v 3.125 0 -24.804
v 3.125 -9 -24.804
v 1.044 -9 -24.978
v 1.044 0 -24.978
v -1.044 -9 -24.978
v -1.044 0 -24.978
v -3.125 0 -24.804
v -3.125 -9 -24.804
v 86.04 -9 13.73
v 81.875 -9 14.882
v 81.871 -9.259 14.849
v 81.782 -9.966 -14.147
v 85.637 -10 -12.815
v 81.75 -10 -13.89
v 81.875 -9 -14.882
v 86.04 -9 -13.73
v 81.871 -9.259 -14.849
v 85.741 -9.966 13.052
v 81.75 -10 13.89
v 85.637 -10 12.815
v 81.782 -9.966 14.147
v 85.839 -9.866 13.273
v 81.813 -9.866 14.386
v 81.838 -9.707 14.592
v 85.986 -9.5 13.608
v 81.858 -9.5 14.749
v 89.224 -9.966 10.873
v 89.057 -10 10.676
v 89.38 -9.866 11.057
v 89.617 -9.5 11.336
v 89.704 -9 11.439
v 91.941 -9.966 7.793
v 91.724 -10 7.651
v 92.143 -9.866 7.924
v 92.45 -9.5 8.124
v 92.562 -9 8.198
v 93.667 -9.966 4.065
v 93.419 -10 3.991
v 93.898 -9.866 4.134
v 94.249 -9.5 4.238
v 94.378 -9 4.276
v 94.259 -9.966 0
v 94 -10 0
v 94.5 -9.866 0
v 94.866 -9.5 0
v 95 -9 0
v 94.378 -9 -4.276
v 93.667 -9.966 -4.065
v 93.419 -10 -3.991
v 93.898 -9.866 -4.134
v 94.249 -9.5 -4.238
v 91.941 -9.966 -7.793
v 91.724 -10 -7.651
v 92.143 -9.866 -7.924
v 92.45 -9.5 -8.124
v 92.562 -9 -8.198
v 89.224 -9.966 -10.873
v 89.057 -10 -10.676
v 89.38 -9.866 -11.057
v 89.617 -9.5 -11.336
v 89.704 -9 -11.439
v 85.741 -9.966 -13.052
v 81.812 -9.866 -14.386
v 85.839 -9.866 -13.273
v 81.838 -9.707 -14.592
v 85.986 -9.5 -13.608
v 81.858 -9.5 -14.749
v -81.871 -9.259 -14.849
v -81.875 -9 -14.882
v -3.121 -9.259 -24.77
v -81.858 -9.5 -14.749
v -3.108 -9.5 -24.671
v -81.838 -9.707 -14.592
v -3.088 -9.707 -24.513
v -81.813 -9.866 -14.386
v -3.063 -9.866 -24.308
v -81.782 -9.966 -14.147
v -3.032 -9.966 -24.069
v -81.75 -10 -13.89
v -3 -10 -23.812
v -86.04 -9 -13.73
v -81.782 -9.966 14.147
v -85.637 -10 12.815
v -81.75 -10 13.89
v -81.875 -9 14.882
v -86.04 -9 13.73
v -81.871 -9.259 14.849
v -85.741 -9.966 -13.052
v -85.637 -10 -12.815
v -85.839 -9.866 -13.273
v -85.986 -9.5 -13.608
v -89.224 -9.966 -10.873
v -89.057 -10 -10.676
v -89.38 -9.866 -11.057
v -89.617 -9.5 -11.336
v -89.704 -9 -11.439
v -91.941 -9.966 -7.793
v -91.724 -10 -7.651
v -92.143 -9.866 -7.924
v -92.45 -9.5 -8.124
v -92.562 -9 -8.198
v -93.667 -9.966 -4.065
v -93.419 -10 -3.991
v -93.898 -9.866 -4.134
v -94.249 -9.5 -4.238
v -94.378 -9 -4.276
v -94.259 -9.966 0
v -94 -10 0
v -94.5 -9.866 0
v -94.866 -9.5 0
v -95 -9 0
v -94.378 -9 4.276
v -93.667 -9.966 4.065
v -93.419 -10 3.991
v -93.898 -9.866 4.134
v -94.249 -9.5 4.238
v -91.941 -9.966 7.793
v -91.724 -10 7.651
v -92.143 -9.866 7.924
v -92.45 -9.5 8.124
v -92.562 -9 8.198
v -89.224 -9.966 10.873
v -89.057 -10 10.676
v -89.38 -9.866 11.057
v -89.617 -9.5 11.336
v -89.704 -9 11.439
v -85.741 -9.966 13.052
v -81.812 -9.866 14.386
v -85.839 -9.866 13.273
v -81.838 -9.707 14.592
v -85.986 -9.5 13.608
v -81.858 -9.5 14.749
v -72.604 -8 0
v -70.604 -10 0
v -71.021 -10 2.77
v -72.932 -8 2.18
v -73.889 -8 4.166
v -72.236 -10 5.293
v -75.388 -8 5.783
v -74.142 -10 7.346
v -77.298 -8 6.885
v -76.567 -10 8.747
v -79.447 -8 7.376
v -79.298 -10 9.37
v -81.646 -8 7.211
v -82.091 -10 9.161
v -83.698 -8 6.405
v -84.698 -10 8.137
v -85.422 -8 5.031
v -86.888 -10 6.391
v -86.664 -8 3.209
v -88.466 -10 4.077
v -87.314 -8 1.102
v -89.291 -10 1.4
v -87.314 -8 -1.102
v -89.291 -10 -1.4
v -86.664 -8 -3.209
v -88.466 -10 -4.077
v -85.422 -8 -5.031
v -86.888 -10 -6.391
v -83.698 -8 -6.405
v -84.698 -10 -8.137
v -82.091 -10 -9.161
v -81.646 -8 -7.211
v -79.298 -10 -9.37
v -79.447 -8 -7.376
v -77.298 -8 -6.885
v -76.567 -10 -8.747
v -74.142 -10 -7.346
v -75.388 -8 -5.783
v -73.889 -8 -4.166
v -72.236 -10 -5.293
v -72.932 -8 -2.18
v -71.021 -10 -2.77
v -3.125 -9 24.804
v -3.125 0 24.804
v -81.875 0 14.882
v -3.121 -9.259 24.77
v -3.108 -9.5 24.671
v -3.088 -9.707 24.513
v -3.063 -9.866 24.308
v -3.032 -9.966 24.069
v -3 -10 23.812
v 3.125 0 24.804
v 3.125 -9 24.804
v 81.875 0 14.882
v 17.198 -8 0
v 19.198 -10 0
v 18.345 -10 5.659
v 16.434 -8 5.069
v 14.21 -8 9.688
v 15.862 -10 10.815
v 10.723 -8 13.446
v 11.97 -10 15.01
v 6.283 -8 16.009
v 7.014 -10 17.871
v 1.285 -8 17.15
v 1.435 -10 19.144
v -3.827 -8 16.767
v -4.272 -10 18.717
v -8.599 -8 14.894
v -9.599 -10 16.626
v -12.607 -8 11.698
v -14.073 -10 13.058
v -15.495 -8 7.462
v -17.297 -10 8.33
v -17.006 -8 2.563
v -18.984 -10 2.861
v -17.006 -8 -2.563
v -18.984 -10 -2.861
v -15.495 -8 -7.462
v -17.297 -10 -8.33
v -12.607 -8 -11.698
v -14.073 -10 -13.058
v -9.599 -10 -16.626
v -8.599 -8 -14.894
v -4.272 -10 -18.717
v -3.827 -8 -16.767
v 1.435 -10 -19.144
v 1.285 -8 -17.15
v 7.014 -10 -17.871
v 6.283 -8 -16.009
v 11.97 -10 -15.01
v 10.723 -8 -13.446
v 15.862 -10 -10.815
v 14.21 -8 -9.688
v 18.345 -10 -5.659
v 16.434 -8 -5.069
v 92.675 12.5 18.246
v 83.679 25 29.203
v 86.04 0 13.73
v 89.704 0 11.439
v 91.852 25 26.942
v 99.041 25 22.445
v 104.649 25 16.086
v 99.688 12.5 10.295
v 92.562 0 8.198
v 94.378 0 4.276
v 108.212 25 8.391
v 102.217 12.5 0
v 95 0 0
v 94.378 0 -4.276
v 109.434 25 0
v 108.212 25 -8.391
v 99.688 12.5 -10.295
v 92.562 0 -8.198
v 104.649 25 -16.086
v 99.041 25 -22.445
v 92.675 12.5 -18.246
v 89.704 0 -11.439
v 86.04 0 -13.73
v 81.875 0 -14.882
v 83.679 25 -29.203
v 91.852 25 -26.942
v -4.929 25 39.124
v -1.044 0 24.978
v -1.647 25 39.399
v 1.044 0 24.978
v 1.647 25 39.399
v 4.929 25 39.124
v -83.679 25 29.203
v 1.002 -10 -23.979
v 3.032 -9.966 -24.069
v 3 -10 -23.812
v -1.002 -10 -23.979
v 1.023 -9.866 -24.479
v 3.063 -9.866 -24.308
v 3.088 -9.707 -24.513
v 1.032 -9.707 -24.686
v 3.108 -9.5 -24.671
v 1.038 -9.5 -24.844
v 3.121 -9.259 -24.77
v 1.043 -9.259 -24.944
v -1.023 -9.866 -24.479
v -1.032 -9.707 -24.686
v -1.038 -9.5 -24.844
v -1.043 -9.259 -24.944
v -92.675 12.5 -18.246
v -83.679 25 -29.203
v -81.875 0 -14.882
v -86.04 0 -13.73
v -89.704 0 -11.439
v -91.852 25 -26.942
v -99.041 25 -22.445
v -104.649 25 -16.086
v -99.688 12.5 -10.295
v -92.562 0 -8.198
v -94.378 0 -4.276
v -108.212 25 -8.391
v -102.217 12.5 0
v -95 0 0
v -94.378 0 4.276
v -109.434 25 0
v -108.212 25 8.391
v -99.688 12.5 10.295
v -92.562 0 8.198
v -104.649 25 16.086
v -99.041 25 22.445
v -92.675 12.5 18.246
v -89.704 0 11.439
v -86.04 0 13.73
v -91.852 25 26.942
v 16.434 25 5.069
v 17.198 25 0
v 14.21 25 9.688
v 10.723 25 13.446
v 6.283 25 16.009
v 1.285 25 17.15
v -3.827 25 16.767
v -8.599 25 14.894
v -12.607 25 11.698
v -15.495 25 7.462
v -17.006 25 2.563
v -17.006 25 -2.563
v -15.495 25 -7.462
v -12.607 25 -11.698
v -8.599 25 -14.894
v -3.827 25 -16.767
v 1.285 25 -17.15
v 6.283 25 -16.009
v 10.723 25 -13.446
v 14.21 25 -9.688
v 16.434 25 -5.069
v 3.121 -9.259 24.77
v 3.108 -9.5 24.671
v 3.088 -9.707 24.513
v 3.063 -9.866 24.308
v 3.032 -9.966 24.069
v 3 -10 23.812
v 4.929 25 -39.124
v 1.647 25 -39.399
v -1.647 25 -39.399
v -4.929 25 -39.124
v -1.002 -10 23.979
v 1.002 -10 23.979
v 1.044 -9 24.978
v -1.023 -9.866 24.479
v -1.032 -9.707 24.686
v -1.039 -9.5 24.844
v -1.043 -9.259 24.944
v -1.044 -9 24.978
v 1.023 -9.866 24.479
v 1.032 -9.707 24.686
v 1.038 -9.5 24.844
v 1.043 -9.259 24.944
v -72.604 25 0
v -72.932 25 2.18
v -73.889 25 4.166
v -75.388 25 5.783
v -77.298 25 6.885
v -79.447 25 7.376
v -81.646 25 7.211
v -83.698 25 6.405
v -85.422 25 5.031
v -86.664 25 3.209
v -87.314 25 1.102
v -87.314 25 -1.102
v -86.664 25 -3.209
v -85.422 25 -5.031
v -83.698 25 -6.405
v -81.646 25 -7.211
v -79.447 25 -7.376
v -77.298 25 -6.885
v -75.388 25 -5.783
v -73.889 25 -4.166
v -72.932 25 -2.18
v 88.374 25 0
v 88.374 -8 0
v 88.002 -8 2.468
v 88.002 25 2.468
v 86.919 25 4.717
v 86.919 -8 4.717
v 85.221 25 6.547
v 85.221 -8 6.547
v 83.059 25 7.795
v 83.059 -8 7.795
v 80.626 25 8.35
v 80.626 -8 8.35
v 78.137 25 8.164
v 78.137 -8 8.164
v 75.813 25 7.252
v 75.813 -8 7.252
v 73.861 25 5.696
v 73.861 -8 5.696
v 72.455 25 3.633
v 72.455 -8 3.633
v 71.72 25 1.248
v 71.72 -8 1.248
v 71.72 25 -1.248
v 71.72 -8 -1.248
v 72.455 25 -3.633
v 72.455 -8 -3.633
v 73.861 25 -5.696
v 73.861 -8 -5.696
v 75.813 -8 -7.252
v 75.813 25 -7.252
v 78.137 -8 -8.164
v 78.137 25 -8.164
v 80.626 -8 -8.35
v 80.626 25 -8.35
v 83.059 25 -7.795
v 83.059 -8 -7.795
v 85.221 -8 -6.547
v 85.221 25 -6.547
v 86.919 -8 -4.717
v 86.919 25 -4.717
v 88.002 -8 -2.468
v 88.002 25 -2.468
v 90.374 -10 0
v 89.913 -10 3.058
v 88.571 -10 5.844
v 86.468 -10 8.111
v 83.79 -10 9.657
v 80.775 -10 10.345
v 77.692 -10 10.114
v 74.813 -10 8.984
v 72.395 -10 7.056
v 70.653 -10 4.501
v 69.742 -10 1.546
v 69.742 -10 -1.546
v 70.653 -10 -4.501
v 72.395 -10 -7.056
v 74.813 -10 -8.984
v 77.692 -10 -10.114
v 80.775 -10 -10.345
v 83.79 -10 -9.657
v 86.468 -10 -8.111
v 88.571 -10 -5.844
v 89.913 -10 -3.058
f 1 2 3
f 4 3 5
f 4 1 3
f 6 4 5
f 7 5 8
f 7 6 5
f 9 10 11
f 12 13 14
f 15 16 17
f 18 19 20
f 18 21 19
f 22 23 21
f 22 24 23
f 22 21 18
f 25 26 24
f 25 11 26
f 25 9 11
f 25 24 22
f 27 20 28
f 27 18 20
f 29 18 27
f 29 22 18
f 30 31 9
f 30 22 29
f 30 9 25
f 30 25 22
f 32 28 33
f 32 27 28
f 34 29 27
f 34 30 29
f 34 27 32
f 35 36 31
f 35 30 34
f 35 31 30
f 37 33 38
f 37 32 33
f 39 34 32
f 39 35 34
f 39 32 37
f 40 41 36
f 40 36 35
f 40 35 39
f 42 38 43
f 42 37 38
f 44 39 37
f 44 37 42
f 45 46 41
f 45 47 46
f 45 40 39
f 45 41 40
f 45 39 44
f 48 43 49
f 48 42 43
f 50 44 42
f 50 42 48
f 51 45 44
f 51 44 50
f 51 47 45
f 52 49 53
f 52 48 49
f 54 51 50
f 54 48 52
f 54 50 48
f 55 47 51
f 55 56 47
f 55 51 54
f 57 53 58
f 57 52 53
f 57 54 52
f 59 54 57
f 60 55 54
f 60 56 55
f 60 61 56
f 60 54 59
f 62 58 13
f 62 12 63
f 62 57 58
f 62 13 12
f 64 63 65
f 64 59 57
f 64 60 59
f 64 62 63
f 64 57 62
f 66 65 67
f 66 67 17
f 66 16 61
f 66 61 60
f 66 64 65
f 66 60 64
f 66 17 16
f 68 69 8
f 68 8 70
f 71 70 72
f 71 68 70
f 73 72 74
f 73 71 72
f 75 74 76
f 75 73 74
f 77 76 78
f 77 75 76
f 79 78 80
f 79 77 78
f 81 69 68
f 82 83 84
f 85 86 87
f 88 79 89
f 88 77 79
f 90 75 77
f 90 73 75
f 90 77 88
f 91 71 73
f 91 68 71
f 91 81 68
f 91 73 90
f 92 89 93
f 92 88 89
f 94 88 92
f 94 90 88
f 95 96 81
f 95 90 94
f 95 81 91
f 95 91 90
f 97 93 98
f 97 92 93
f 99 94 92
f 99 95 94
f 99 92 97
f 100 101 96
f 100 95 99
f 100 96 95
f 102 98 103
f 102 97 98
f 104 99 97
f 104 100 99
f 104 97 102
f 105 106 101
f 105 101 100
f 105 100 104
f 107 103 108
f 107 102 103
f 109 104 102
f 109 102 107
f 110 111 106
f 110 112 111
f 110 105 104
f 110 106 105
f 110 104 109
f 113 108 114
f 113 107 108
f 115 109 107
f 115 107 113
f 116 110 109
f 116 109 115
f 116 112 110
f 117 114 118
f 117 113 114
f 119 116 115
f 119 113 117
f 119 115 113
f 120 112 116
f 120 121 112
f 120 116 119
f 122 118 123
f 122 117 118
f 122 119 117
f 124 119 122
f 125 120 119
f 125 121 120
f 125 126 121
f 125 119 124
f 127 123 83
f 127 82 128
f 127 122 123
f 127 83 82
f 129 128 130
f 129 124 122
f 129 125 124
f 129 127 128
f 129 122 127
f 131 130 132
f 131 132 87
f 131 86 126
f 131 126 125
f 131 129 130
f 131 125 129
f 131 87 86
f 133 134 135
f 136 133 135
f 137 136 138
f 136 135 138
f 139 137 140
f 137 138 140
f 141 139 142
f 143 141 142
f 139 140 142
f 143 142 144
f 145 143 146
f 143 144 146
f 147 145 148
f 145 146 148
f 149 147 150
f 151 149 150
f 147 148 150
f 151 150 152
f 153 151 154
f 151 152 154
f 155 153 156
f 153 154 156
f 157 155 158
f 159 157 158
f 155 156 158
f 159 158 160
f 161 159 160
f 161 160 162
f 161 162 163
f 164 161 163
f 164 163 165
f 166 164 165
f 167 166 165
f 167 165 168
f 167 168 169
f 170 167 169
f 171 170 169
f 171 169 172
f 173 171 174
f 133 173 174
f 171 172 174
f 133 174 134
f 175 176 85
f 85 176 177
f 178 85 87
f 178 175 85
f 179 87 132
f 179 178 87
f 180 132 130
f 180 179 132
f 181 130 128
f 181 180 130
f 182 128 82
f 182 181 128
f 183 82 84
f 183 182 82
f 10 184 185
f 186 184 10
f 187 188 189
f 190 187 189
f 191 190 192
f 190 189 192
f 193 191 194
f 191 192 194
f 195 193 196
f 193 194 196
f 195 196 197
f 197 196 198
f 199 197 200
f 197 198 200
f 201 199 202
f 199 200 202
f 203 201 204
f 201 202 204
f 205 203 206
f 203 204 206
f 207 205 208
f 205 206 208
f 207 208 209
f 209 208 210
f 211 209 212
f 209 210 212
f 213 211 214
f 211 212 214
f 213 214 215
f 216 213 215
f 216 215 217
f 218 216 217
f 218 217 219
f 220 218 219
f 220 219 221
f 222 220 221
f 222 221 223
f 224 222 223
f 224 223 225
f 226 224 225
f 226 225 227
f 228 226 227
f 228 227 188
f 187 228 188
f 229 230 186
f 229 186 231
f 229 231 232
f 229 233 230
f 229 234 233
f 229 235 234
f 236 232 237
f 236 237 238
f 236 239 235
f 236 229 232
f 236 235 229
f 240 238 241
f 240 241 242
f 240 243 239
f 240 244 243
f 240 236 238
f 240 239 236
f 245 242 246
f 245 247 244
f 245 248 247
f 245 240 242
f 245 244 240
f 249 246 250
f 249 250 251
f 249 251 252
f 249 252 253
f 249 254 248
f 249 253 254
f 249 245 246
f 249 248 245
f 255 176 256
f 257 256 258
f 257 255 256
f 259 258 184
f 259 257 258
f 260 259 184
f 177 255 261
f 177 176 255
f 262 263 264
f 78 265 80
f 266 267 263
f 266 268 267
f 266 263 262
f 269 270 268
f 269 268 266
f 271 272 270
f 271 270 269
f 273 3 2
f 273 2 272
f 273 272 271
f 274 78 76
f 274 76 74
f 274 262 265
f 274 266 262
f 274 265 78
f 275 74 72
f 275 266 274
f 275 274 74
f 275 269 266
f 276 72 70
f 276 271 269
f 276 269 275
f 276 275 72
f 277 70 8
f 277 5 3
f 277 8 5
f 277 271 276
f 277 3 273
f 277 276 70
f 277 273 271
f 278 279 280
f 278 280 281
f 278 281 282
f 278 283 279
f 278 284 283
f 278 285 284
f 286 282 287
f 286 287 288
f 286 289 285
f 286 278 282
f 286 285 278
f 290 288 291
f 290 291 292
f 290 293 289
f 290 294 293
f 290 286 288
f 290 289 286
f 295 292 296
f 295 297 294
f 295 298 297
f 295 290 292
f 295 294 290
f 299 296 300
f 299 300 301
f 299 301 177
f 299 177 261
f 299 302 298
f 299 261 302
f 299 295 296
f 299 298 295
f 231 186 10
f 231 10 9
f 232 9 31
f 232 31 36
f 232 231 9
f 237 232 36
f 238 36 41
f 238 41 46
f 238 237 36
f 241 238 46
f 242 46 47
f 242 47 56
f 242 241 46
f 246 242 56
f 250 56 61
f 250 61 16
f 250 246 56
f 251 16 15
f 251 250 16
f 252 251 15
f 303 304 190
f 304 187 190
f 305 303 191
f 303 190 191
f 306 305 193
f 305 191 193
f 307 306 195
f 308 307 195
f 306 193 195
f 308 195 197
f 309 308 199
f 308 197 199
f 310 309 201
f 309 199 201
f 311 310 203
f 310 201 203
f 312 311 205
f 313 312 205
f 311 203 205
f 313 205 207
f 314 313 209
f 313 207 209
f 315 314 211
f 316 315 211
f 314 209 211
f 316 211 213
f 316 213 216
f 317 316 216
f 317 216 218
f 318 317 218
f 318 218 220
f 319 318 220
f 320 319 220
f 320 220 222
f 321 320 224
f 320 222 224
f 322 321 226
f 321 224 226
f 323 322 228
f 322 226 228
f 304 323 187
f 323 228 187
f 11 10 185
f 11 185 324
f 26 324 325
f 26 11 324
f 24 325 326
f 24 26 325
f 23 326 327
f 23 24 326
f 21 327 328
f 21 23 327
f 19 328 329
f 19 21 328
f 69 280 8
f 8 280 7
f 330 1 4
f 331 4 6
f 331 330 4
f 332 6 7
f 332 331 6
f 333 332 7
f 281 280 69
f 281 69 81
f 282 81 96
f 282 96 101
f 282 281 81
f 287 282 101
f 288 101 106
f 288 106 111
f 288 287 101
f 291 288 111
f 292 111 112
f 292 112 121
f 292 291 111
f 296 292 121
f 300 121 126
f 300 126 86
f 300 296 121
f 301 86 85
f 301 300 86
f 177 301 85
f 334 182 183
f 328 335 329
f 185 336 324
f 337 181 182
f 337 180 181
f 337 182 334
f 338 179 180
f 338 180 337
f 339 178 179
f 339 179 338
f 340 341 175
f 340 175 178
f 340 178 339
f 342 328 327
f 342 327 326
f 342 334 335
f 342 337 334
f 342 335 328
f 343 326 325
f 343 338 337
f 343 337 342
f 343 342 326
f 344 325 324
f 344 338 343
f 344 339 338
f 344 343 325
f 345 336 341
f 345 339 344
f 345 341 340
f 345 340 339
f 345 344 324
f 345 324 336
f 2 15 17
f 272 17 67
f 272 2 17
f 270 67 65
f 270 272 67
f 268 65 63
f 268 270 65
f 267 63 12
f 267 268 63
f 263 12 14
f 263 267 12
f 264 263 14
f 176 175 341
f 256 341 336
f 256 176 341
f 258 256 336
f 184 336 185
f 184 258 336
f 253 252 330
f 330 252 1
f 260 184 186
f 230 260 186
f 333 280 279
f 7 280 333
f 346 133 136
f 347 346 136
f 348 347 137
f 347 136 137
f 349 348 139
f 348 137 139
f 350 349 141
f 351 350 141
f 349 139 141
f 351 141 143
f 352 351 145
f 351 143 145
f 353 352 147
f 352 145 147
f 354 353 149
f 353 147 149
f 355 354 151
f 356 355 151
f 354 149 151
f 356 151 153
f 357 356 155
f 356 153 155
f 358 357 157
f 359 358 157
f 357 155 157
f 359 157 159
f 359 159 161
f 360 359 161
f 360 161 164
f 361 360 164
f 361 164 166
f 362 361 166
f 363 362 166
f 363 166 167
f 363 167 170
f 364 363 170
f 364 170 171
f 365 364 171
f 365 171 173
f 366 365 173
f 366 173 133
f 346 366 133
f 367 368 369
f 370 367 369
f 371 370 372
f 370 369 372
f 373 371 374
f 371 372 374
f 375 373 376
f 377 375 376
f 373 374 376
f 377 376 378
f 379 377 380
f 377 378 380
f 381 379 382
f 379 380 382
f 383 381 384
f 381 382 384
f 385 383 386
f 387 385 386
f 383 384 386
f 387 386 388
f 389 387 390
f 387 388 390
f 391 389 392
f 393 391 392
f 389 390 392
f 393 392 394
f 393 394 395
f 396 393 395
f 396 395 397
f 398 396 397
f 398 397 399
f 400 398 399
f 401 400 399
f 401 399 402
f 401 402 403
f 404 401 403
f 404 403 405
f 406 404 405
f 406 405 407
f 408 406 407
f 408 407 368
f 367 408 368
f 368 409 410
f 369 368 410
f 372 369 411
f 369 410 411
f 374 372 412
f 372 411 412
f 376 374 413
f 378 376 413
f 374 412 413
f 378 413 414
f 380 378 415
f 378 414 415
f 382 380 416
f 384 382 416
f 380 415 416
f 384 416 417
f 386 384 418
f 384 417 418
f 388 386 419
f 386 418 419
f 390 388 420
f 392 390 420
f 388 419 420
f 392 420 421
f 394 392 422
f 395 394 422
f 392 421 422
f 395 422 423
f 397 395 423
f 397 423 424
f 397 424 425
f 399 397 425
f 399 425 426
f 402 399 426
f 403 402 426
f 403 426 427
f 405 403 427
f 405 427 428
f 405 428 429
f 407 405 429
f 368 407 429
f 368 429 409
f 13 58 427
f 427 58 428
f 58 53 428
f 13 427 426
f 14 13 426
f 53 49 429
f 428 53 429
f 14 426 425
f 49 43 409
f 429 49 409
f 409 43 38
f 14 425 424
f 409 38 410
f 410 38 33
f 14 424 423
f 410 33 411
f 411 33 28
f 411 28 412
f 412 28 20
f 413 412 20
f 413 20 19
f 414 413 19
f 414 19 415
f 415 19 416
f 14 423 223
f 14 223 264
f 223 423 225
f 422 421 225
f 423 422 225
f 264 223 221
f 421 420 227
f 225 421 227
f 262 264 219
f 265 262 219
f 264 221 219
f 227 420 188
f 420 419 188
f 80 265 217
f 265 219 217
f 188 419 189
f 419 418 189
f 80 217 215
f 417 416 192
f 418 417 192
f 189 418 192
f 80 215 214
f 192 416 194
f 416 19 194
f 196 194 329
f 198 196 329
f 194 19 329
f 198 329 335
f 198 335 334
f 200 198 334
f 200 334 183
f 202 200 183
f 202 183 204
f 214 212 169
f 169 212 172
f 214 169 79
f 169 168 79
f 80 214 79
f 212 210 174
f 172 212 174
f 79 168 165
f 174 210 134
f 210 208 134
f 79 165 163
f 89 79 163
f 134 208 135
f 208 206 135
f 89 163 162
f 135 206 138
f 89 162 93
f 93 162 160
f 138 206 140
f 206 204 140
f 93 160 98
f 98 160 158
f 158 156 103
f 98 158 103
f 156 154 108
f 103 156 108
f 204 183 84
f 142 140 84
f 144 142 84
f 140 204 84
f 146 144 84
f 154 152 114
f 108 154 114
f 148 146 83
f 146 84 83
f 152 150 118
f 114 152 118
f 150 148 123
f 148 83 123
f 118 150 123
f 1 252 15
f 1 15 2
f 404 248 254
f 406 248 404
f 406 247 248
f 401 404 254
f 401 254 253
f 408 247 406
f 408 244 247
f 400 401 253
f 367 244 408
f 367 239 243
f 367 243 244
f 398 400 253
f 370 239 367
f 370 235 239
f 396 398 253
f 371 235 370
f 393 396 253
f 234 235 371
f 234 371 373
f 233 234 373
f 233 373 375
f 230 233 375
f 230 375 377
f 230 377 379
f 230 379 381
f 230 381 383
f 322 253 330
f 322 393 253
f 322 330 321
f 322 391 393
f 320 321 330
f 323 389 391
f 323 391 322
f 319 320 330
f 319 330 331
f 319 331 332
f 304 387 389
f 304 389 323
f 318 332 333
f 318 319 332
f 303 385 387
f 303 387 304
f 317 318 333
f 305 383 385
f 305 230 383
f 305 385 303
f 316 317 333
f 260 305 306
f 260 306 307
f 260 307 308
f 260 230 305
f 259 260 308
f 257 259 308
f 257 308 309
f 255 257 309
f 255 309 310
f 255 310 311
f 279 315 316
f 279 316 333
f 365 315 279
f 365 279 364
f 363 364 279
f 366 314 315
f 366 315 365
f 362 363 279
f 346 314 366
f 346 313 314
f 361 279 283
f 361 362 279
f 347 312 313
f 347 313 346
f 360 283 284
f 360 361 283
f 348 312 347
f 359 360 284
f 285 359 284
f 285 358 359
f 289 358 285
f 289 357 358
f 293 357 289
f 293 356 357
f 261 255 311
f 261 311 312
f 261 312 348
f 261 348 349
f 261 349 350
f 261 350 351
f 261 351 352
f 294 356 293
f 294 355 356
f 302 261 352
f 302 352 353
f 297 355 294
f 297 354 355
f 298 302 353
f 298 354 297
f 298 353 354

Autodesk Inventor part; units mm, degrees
ref_plane "YZ Plane" through (0, 0, 0) normal (1, 0, 0) x (0, 1, 0)
ref_plane "XZ Plane" through (0, 0, 0) normal (0, 1, 0) x (-1, 0, 0)
ref_plane "XY Plane" through (0, 0, 0) normal (0, 0, 1) x (1, 0, 0)
sketch "Boceto1" plane through (0, 0, 0) normal (0, 1, 0) x (-1, 0, 0)
  arc A0 (81.875, -14.8824) -> (81.875, 14.8824) centre (80, 0) ccw
  line L0 (81.875, -14.8824) -> (3.125, -24.8039)
  line L1 (3.125, 24.8039) -> (81.875, 14.8824)
  line L2 (0, -32.0701) -> (0, 49.2426) construction
  arc A1 (-81.875, 14.8824) -> (-81.875, -14.8824) centre (-80, 0) ccw
  line L3 (-81.875, -14.8824) -> (-3.125, -24.8039)
  line L4 (-3.125, 24.8039) -> (-81.875, 14.8824)
  arc A2 (3.125, 24.8039) -> (-3.125, 24.8039) centre (0, 0) ccw
  arc A3 (-3.125, -24.8039) -> (3.125, -24.8039) centre (0, 0) ccw
  dimension "d1" = 30
  dimension "d2" = 80
extrude "Extrusión1" add sketch "Boceto1" along normal blind 25 draft 30 and the other way blind 10
sketch "Boceto2" plane through (0, -10, 0) normal (0, -1, 0) x (1, 0, 0)
  arc A0 (81.875, -14.8824) -> (81.875, 14.8824) centre (80, 0) ccw projected
  line L0 (81.875, 14.8824) -> (3.125, 24.8039) projected
  arc A1 (3.125, 24.8039) -> (-3.125, 24.8039) centre (0, 0) ccw projected
  line L1 (-3.125, 24.8039) -> (-81.875, 14.8824) projected
  arc A2 (-81.875, 14.8824) -> (-81.875, -14.8824) centre (-80, 0) ccw projected
  line L2 (-81.875, -14.8824) -> (-3.125, -24.8039) projected
  arc A3 (-3.125, -24.8039) -> (3.125, -24.8039) centre (0, 0) ccw projected
  line L3 (3.125, -24.8039) -> (81.875, -14.8824) projected
  circle A4 centre (0, 0) radius 17.1981
  circle A5 centre (-80, 0) radius 7.3963
  circle A6 centre (80, 0) radius 8.3739
extrude "Extrusión2" cut sketch "Boceto2" against normal through all contours A4 | A5 | A6
chamfer "Chaflán1" distance 2 angle 45 1 edges at (-87.3963, -10, 0)
chamfer "Chaflán2" distance 2 angle 45 1 edges at (-17.1981, -10, 0)
chamfer "Chaflán3" distance 2 angle 45 1 edges at (71.6261, -10, 0)
fillet "Empalme1" radius 1 8 edges at (0, -10, -25) (42.5, -10, -19.8431) (95, -10, 0) (42.5, -10, 19.8431) (0, -10, 25) (-42.5, -10, 19.8431) (-95, -10, 0) (-42.5, -10, -19.8431)
equation "\"Radio_pliegue\" = Grosor"
equation "\"Anchura_desahogo_plegado\" = Grosor"
equation "\"Profundidad_desahogo_plegado\" = 0.5 * Grosor"
equation "\"Tamaño_destalonado\" = 4 * Grosor"
equation "\"Remanente_mínimo\" = 2 * Grosor"
equation "\"Radiodetransición\" = Radio_pliegue"
equation "\"Tamaño_de_radio_de_Jacobi\" = Radio_pliegue"
equation "\"TamañoSeparación\" = Grosor"
equation "\"Grosor\" = 0.5"
properties part number "Practica4" material "Aluminio 6061-AHC"
